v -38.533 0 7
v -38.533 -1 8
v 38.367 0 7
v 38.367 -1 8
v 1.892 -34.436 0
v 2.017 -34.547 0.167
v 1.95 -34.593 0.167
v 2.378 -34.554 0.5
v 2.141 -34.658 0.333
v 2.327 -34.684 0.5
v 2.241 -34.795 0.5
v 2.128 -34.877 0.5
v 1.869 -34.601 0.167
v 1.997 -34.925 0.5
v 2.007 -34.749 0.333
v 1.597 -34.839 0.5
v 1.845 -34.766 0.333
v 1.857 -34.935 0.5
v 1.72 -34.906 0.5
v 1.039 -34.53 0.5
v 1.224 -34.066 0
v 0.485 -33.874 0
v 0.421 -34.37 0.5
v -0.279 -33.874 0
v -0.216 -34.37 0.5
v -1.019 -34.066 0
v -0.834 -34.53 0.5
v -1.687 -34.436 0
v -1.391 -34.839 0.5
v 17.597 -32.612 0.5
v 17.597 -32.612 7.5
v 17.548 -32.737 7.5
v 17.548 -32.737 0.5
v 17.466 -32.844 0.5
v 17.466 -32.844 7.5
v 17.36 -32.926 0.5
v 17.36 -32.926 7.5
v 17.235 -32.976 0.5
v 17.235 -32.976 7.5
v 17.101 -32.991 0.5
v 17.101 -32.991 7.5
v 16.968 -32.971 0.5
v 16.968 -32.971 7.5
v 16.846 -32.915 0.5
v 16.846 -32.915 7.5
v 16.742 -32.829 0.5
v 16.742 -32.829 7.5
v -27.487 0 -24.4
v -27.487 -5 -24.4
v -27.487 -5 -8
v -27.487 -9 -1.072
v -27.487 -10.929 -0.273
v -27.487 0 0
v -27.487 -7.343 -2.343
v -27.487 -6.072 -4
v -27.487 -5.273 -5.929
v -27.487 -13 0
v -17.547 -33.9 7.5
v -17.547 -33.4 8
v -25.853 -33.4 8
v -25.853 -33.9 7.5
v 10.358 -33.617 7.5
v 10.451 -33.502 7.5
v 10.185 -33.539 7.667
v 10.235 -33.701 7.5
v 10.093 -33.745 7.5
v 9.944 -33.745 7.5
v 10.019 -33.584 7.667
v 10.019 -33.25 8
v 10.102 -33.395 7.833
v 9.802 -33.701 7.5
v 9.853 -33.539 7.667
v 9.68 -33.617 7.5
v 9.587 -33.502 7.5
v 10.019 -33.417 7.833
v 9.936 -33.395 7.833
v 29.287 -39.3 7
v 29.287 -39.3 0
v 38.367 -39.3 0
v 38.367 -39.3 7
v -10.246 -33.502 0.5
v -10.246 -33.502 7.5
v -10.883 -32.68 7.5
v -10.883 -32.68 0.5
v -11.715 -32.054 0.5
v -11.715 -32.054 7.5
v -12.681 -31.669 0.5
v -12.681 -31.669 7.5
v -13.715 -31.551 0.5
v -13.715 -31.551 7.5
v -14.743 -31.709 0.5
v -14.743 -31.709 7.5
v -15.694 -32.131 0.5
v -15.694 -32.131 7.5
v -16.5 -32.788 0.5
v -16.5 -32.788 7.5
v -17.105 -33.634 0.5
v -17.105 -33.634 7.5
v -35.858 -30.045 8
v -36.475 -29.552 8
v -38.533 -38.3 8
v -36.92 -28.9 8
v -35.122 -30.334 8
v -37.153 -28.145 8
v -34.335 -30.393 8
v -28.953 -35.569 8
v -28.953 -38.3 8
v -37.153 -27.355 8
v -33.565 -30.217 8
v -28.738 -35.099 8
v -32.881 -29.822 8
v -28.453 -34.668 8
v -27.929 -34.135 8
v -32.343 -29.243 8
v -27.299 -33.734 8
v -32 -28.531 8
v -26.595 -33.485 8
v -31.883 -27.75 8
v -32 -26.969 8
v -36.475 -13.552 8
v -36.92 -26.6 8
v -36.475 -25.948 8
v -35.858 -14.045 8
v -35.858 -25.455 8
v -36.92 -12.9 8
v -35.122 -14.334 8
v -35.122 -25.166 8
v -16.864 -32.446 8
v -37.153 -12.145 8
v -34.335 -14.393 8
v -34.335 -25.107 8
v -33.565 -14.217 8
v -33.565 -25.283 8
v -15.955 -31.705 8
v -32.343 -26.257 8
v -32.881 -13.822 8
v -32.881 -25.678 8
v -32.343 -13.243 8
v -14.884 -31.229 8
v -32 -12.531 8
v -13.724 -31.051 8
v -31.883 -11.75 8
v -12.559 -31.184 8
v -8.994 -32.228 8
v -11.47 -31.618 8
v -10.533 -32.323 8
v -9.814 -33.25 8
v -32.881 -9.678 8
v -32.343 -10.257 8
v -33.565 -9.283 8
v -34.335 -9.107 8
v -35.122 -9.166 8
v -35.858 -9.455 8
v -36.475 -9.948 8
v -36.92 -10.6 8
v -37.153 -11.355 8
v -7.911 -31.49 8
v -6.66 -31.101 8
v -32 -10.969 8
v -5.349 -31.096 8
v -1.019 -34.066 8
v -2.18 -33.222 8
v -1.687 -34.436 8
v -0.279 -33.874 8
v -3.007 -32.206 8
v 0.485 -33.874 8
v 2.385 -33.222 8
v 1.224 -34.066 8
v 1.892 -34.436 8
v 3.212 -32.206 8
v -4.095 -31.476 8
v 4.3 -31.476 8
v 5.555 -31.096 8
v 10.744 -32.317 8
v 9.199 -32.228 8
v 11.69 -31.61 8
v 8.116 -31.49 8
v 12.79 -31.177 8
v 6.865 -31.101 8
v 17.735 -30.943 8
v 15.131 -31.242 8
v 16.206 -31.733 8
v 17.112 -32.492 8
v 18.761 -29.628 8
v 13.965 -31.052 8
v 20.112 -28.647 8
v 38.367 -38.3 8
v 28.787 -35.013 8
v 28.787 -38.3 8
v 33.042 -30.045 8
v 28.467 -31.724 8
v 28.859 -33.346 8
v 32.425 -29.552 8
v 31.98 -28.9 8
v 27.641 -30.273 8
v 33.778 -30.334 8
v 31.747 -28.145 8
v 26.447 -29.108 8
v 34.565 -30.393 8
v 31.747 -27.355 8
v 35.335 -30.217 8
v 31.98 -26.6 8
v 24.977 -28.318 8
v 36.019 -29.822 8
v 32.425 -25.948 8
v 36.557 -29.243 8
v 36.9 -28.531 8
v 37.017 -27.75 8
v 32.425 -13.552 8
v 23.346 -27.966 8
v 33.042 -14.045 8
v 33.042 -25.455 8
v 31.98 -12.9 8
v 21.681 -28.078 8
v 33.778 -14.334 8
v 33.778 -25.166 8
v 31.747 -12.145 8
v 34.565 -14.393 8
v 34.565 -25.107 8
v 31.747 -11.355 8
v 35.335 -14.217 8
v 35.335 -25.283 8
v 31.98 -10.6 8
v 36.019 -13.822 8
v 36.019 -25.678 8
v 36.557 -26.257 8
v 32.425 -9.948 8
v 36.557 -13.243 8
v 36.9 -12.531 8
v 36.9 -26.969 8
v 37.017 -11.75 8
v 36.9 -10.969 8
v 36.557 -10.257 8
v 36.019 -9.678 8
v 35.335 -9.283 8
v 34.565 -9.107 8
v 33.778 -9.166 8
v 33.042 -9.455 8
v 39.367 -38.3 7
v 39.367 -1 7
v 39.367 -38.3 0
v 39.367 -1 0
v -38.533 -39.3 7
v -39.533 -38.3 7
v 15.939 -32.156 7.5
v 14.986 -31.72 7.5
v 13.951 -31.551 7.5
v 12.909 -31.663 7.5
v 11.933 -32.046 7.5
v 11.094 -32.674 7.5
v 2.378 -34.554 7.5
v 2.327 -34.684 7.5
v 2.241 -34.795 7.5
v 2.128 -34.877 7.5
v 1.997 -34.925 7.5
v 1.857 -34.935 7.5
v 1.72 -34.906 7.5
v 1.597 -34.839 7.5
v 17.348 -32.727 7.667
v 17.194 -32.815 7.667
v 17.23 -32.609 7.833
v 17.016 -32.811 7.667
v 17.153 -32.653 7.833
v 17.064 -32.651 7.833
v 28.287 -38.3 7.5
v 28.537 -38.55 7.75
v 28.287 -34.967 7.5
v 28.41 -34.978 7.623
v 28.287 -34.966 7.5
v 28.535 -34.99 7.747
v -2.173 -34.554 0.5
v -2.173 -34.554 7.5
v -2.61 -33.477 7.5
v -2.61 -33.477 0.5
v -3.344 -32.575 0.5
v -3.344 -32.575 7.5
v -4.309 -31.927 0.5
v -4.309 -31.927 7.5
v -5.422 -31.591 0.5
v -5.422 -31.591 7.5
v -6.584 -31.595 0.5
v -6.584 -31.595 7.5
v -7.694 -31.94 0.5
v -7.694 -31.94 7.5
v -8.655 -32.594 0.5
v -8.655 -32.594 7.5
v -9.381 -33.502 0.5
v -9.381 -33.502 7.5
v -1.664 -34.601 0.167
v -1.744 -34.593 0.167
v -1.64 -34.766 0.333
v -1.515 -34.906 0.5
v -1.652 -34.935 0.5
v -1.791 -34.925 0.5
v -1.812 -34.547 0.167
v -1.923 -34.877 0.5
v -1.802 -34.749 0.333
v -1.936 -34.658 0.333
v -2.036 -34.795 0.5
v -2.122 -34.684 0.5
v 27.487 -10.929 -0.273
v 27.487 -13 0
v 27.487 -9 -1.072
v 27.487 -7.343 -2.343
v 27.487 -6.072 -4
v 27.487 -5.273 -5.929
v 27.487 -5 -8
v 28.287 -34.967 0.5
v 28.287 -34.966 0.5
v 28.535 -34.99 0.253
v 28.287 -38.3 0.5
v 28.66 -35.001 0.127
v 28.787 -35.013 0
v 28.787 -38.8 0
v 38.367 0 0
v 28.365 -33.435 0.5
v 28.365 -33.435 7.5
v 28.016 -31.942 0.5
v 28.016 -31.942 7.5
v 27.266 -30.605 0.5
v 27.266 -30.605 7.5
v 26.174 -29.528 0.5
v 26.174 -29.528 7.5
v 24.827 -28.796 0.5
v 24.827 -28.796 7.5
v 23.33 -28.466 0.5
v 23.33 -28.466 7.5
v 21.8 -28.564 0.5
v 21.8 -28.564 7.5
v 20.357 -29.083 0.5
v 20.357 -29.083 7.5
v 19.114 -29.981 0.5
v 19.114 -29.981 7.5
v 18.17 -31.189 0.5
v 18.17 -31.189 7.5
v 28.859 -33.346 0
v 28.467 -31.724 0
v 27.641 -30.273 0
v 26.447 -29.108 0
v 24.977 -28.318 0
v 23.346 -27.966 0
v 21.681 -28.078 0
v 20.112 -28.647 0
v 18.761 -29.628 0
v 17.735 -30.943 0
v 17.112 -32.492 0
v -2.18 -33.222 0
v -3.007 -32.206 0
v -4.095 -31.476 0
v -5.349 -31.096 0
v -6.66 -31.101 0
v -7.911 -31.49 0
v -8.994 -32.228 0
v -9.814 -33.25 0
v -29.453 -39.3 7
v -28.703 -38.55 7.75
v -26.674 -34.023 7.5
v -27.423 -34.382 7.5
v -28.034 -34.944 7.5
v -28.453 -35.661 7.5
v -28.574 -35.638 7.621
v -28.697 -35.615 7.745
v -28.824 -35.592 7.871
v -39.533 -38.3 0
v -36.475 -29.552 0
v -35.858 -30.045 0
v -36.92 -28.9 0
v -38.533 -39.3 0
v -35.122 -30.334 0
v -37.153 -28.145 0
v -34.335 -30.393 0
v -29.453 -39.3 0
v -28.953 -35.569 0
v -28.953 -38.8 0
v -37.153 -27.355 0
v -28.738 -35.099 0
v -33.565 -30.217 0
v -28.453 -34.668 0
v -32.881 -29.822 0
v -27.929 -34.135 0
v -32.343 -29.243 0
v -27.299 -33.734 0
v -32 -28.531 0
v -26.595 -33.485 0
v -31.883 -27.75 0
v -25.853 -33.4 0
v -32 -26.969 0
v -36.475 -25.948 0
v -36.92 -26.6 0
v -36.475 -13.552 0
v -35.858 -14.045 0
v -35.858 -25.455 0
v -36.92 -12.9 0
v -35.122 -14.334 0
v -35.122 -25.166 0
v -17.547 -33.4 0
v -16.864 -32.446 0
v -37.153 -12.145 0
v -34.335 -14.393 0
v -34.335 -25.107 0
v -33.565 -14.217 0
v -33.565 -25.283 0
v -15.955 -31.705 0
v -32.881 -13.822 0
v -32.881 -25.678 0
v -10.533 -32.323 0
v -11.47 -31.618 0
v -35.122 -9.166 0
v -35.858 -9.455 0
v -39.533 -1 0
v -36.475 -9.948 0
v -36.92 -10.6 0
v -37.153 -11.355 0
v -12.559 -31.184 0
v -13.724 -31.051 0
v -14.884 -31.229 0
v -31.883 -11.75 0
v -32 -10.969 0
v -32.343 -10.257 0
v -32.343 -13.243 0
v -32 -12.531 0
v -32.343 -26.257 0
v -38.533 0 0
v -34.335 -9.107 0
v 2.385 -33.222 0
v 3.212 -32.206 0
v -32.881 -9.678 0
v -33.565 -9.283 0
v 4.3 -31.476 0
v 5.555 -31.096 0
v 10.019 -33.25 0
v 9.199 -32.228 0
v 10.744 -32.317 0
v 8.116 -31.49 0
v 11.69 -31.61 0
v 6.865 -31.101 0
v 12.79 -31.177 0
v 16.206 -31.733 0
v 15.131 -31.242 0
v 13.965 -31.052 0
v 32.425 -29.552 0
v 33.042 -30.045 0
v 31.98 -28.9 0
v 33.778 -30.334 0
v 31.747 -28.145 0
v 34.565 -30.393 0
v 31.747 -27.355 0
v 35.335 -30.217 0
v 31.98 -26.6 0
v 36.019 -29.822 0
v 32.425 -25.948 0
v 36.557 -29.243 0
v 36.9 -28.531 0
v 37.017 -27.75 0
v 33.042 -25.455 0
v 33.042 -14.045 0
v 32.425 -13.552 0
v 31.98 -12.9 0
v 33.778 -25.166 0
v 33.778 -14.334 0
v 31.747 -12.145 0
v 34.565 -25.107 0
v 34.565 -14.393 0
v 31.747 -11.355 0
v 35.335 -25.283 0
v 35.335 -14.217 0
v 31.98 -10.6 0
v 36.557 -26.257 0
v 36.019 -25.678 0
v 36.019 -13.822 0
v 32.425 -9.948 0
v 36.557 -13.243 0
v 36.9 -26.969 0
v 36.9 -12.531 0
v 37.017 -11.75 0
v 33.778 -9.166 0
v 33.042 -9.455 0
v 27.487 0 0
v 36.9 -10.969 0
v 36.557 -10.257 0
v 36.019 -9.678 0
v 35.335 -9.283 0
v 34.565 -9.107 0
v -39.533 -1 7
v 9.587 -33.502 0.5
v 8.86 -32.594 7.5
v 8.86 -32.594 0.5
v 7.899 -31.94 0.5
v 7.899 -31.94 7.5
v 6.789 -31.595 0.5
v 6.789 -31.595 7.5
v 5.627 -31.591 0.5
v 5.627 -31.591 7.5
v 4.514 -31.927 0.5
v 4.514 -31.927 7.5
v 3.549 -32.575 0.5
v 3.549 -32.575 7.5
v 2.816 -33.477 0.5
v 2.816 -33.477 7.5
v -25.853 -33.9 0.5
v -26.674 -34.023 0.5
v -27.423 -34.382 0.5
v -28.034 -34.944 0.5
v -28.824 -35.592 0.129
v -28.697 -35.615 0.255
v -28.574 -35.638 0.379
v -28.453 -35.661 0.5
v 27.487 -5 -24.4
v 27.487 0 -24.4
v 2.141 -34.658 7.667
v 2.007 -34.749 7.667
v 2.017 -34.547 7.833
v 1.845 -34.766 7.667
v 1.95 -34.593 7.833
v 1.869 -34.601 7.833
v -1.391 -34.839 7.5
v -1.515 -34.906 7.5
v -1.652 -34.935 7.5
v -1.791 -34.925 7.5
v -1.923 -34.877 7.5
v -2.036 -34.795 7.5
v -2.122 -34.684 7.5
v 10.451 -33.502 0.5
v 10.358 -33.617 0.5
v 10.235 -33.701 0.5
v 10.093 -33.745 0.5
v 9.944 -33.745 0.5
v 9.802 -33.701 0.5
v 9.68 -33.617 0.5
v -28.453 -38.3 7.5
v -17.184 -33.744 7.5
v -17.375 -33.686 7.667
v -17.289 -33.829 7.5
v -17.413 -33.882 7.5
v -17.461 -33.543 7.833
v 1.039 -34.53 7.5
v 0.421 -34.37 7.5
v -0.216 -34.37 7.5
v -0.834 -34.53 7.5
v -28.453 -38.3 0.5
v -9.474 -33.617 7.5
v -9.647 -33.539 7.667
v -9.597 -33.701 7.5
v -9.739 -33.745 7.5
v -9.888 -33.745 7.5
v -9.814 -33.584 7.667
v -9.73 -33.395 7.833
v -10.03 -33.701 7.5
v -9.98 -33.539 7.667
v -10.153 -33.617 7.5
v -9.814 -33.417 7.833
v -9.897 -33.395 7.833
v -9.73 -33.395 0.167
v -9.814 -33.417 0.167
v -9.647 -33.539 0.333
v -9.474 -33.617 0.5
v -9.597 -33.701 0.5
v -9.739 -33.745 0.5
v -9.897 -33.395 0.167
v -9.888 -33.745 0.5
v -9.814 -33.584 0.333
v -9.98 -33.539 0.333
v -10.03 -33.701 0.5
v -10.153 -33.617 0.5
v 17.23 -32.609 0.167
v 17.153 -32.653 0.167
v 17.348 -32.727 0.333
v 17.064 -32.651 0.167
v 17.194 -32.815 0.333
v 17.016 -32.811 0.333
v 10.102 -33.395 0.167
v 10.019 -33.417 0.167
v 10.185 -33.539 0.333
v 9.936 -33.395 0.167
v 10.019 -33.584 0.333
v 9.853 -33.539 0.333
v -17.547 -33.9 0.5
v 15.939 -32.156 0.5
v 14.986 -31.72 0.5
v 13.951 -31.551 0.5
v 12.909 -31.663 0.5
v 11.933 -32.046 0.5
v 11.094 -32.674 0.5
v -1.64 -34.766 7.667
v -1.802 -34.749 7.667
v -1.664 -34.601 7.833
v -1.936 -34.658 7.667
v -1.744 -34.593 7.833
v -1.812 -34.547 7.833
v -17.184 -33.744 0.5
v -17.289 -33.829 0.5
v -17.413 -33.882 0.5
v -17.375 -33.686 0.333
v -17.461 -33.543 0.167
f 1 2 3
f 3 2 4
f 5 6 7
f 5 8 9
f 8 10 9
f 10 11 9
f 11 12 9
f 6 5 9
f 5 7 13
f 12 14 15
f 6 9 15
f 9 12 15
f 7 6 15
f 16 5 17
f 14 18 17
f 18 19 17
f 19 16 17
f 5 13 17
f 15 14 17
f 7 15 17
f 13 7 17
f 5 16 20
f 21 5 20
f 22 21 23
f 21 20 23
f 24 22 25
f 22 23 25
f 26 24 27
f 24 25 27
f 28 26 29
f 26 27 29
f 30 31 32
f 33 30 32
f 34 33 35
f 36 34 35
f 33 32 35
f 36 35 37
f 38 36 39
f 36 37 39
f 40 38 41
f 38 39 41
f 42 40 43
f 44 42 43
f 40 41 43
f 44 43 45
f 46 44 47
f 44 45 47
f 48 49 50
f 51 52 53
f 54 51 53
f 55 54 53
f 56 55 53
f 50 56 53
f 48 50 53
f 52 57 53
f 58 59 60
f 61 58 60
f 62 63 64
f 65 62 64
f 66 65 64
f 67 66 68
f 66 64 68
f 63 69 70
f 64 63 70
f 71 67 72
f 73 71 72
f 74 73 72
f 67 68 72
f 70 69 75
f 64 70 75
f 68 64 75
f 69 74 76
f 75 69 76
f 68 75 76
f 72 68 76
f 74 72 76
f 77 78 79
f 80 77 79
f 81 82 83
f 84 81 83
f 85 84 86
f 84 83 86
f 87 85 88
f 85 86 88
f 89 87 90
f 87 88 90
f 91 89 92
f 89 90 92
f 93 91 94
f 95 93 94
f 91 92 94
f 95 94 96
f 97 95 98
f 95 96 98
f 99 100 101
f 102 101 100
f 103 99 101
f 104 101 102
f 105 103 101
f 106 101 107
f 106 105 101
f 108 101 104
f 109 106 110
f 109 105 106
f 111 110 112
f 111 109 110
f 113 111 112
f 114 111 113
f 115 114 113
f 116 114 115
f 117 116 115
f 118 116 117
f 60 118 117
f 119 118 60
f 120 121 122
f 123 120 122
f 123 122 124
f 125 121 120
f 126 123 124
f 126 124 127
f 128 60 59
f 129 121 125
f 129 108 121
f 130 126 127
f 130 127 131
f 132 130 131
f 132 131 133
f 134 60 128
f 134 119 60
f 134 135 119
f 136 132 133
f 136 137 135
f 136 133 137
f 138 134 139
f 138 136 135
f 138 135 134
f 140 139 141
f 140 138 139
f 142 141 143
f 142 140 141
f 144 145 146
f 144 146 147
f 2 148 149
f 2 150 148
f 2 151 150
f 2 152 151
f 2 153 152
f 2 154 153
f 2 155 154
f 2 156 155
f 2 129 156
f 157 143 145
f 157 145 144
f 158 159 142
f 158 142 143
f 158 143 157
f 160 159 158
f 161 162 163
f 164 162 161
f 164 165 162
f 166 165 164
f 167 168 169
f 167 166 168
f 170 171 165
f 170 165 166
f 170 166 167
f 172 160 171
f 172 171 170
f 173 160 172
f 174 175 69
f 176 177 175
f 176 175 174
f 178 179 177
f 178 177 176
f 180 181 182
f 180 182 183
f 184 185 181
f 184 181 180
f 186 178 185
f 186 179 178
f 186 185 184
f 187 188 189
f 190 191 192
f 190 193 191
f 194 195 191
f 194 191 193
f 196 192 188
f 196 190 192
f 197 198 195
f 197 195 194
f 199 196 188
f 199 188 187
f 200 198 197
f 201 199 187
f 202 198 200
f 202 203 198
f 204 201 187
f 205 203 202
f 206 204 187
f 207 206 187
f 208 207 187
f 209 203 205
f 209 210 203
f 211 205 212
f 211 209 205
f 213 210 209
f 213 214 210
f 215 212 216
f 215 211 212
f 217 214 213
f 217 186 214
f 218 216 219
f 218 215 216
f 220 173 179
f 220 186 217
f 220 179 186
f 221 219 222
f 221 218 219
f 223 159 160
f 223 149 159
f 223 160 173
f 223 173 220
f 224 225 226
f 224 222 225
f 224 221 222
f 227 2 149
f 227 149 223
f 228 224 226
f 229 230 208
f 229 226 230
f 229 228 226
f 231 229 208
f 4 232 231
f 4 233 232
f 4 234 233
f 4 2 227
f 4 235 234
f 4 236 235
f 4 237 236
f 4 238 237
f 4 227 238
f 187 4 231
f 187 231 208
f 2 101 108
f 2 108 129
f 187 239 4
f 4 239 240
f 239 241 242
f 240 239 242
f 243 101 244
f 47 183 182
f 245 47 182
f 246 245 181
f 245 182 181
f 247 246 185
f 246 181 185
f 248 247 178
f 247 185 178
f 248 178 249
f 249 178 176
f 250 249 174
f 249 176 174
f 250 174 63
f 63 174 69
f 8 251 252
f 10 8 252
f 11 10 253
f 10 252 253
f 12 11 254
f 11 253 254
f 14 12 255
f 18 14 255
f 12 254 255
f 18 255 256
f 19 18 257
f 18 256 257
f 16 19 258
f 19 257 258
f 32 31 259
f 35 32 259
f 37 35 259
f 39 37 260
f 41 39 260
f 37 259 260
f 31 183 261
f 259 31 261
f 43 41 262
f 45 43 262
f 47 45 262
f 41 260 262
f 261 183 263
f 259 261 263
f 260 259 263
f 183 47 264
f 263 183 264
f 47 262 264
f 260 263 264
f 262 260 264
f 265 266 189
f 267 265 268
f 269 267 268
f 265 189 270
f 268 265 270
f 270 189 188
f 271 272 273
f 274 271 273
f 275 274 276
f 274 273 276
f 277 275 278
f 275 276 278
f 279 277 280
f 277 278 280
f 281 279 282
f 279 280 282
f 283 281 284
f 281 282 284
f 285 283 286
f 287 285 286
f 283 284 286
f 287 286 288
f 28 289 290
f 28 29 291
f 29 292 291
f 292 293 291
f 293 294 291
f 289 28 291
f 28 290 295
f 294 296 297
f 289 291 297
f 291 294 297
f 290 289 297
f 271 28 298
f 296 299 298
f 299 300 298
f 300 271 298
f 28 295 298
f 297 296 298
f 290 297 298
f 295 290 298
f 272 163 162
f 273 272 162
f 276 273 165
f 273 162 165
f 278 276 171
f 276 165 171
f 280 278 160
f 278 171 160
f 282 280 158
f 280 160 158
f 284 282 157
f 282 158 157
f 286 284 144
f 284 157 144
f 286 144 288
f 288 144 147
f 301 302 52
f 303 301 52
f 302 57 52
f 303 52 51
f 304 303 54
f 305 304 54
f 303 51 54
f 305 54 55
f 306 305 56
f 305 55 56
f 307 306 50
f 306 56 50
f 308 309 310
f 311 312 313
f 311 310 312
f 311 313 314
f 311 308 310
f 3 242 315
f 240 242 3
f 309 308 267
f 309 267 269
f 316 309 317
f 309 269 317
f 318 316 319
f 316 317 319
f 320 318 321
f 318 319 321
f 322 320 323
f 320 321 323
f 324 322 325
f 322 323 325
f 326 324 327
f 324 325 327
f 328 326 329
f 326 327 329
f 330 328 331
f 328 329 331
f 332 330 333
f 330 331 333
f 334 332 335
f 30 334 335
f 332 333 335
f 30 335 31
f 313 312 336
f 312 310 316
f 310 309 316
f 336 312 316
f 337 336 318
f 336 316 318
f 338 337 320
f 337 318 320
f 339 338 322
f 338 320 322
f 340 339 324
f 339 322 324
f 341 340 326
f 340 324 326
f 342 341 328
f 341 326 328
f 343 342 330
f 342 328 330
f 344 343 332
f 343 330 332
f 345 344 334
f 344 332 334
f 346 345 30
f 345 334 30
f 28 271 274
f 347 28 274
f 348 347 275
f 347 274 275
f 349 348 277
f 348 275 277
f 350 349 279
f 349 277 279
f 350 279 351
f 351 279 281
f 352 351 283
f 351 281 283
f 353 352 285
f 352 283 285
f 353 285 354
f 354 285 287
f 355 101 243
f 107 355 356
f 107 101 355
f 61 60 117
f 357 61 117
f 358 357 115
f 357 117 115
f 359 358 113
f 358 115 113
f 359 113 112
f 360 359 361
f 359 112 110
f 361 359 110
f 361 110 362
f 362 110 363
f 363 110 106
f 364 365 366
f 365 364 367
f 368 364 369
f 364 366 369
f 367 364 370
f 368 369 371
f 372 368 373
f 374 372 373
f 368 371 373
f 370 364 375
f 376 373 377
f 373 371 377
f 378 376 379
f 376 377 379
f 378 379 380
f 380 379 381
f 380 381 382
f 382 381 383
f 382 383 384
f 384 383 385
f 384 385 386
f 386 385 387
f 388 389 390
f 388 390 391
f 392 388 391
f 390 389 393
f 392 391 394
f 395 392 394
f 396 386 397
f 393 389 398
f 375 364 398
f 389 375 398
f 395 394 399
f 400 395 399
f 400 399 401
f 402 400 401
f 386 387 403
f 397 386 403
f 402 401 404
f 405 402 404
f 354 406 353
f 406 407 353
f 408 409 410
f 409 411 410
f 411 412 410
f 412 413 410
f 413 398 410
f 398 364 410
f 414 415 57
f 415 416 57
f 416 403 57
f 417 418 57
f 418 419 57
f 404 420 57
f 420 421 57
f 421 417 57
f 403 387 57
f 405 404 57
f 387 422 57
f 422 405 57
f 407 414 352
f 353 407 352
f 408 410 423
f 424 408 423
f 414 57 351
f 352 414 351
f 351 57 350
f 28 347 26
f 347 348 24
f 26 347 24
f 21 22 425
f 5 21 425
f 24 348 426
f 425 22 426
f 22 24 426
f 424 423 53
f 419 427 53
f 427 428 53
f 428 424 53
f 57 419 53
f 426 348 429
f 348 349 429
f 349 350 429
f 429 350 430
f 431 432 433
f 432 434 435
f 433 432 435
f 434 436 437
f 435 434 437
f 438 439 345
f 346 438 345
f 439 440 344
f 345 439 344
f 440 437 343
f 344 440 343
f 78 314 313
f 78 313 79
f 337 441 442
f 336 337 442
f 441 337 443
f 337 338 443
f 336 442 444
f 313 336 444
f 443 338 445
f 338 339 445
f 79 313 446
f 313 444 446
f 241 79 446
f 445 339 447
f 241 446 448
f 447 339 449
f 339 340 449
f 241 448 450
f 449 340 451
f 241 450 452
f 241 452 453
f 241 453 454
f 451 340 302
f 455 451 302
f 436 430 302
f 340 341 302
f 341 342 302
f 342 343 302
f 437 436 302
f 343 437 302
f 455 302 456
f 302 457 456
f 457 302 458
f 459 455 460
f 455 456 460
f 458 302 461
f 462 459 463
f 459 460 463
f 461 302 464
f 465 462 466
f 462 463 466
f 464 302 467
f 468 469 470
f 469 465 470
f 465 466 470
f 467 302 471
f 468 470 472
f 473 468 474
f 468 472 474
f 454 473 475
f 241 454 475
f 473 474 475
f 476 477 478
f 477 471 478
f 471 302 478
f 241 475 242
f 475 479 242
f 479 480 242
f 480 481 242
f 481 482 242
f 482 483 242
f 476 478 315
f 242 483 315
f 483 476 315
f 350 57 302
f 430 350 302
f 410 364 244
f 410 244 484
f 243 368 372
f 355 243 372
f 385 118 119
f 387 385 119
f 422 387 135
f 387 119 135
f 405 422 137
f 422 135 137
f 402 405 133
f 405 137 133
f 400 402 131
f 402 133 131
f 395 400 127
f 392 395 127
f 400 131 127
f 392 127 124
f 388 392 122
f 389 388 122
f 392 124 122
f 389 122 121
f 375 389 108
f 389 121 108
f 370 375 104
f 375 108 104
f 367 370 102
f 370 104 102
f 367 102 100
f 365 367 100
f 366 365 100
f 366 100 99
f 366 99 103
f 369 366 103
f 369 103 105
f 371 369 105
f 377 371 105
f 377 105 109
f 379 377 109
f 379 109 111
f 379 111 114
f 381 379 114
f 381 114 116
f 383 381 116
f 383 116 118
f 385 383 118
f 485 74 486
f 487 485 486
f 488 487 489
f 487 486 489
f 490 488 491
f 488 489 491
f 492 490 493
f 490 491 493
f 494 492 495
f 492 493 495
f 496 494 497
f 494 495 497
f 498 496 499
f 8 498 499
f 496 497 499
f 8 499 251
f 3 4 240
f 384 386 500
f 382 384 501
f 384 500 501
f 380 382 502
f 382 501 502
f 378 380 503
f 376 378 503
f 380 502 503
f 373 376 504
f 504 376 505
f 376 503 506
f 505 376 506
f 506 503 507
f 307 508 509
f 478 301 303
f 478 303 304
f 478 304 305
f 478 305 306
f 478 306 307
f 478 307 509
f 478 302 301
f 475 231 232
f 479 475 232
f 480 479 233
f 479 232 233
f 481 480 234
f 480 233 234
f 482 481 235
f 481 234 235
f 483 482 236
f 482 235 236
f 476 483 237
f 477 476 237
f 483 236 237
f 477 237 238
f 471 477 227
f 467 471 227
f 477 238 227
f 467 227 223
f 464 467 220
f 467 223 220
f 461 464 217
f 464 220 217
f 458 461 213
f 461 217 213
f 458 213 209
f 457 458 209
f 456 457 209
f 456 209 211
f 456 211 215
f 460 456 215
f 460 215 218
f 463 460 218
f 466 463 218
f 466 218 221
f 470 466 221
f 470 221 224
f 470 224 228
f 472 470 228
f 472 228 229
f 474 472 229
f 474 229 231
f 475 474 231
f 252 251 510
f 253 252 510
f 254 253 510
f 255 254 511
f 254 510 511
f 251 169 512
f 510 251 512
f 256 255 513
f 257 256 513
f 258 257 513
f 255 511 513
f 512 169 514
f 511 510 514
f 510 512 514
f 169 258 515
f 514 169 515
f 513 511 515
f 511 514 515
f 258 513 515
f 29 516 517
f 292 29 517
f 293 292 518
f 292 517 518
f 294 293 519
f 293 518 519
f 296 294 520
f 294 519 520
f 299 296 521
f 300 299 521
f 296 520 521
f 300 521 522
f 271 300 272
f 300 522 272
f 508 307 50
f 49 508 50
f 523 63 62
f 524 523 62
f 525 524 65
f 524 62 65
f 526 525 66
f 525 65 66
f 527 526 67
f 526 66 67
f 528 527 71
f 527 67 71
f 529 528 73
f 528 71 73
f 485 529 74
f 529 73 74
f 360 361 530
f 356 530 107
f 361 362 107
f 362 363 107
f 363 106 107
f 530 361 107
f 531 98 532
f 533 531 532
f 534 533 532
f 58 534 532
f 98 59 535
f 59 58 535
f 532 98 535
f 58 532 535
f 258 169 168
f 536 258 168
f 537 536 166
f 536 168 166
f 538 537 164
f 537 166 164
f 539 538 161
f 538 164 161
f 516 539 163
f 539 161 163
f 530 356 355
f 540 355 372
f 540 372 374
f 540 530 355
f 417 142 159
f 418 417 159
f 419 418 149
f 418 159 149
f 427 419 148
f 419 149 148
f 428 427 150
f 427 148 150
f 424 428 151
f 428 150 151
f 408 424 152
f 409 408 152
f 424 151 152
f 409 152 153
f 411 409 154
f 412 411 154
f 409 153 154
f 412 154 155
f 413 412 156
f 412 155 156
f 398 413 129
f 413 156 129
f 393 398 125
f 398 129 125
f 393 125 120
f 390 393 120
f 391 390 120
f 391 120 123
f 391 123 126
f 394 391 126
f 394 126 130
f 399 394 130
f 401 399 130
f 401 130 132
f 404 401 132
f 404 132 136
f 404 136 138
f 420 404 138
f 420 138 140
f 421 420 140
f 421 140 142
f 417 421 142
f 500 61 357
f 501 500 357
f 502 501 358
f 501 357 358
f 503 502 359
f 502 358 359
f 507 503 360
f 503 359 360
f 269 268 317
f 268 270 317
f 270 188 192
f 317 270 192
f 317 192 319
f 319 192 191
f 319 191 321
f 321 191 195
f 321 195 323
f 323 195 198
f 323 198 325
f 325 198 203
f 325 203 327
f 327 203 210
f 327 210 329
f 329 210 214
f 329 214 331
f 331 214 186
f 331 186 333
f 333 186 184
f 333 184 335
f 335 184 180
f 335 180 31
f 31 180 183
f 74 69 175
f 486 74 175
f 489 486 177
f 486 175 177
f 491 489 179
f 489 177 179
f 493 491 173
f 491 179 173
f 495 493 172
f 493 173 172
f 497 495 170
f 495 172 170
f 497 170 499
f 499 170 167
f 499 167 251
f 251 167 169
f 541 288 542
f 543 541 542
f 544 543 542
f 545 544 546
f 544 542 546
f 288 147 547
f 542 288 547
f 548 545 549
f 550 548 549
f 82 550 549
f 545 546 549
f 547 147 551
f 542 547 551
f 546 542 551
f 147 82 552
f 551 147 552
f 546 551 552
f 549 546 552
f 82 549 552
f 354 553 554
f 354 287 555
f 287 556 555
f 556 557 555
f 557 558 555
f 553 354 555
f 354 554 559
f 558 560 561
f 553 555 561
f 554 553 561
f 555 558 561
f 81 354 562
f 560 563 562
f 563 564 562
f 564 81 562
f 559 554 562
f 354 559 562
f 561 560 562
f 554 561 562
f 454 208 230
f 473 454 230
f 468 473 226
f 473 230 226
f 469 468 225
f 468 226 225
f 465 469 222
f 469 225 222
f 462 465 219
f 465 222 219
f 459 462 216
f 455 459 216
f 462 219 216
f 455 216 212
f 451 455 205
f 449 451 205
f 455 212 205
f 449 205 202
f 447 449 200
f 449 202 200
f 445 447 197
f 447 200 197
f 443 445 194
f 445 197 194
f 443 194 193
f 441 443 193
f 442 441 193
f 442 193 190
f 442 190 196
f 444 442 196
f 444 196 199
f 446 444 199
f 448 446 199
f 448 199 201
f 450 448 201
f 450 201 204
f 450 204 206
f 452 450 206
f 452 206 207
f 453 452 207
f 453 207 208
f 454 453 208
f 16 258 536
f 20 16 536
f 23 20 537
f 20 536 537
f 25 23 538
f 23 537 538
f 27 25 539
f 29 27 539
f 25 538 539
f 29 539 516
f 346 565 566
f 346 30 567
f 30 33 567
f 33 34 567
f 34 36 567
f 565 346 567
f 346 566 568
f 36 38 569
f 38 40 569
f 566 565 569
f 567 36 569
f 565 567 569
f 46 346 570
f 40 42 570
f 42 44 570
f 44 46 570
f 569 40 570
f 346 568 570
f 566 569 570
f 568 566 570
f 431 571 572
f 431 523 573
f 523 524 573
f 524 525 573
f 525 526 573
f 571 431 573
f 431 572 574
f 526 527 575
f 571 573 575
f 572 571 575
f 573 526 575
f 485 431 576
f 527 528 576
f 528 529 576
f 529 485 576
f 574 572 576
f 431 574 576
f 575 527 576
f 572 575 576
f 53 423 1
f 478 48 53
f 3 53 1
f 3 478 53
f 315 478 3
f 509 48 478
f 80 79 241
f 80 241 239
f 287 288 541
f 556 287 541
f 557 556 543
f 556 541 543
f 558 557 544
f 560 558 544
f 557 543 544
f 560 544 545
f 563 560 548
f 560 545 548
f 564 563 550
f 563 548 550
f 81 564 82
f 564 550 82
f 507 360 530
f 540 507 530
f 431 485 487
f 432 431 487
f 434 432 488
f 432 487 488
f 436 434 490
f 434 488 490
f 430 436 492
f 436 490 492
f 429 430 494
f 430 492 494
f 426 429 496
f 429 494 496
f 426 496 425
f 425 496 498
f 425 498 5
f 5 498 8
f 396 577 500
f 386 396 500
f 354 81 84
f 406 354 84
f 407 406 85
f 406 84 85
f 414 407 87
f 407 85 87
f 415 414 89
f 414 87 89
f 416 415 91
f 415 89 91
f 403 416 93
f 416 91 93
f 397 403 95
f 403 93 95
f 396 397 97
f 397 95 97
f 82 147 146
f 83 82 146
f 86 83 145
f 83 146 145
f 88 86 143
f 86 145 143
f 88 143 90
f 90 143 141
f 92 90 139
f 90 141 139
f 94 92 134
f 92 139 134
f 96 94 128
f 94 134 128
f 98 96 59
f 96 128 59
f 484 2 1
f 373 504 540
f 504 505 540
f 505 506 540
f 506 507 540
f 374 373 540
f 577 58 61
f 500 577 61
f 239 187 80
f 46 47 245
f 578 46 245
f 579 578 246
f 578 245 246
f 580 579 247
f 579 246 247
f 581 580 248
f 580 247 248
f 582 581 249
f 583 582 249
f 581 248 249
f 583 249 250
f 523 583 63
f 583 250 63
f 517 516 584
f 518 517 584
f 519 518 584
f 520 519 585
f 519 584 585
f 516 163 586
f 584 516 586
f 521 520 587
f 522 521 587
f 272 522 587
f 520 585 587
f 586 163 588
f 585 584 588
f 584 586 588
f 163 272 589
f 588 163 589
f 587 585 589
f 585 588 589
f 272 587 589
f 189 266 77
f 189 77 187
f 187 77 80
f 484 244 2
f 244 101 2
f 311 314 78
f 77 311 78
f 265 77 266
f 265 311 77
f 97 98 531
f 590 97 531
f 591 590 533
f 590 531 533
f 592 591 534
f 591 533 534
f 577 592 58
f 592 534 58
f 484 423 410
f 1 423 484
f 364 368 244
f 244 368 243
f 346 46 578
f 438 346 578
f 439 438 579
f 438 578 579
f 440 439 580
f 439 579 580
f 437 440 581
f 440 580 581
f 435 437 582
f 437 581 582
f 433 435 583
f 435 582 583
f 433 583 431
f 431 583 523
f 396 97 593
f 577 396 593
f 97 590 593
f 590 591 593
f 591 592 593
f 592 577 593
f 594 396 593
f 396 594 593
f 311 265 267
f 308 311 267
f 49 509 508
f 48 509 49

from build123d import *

# Parameters (mm, degrees)
SKETCH4_W           = 78.9
SKETCH4_H           = 39.3
BOSS_EXTRUDE2_DEPTH = 8
CUT_EXTRUDE2_REACH  = 58.315
CUT_EXTRUDE3_REACH  = 58.315
SKETCH7_R           = 2.65
CHAMFER3_SIZE       = 1
CHAMFER4_SIZE       = 0.5
SKETCH8_W           = 54.974490404
SKETCH8_H           = 5
BOSS_EXTRUDE3_DEPTH = 24.4
FILLET1_R           = 8


with BuildPart() as part:
    # Sketch4 → Boss-Extrude2 (new body)
    with BuildSketch(Plane.XY):
        with Locations((-0.082754798, -19.65)):
            Rectangle(SKETCH4_W, SKETCH4_H)
    extrude(amount=BOSS_EXTRUDE2_DEPTH)

    # Sketch6 → Cut-Extrude2 (cut, up to next)
    with BuildSketch(Plane.XY.offset(8), mode=Mode.PRIVATE) as cut_extrude2_sk1:
        with BuildLine():
            Line((28.287245202, -39.5), (28.287245202, -34.966633333))
            ThreePointArc((28.287245202, -34.966633333), (24.090185885, -28.57821772), (17.597136747, -32.611513376))
            ThreePointArc((17.597136747, -32.611513376), (17.234869858, -32.976161871), (16.742475109, -32.828672095))
            ThreePointArc((16.742475109, -32.828672095), (13.426365224, -31.57225608), (10.450959192, -33.501537013))
            ThreePointArc((10.450959192, -33.501537013), (10.018755802, -33.750140454), (9.586552412, -33.501537013))
            ThreePointArc((9.586552412, -33.501537013), (5.626846324, -31.591156717), (2.378419018, -34.553680172))
            ThreePointArc((2.378419018, -34.553680172), (2.064006845, -34.905939189), (1.596551631, -34.839403086))
            ThreePointArc((1.596551631, -34.839403086), (0.102573651, -34.35), (-1.39140433, -34.839403086))
            ThreePointArc((-1.39140433, -34.839403086), (-1.858859544, -34.905939189), (-2.173271717, -34.553680172))
            ThreePointArc((-2.173271717, -34.553680172), (-5.421699023, -31.591156717), (-9.381405111, -33.501537013))
            ThreePointArc((-9.381405111, -33.501537013), (-9.813608501, -33.750140454), (-10.245811891, -33.501537013))
            ThreePointArc((-10.245811891, -33.501537013), (-13.71465449, -31.550736756), (-17.105314368, -33.634463277))
            ThreePointArc((-17.105314368, -33.634463277), (-17.289281672, -33.828504165), (-17.54693295, -33.9))
            Line((-17.54693295, -33.9), (-25.852754798, -33.9))
            ThreePointArc((-25.852754798, -33.9), (-27.422811269, -34.381612052), (-28.452754798, -35.660769515))
            Line((-28.452754798, -35.660769515), (-28.452754798, -39.5))
            Line((-28.452754798, -39.5), (28.287245202, -39.5))
        make_face()
    cut_extrude2_tool1 = extrude(cut_extrude2_sk1.sketch, amount=-CUT_EXTRUDE2_REACH, mode=Mode.PRIVATE) & part.part
    add(cut_extrude2_tool1.solids().sort_by_distance((2.671043, -35.689379, 8))[0], mode=Mode.SUBTRACT)

    # Sketch7 → Cut-Extrude3 (cut, up to next)
    with BuildSketch(Plane.XY.offset(8), mode=Mode.PRIVATE) as cut_extrude3_sk1:
        with Locations((-34.532754798, -11.75)):
            Circle(SKETCH7_R)
    cut_extrude3_tool1 = extrude(cut_extrude3_sk1.sketch, amount=-CUT_EXTRUDE3_REACH, mode=Mode.PRIVATE) & part.part
    # Sketch7 → Cut-Extrude3 (cut, up to next)
    with BuildSketch(Plane.XY.offset(8), mode=Mode.PRIVATE) as cut_extrude3_sk2:
        with Locations((-34.532754798, -27.75)):
            Circle(SKETCH7_R)
    cut_extrude3_tool2 = extrude(cut_extrude3_sk2.sketch, amount=-CUT_EXTRUDE3_REACH, mode=Mode.PRIVATE) & part.part
    # Sketch7 → Cut-Extrude3 (cut, up to next)
    with BuildSketch(Plane.XY.offset(8), mode=Mode.PRIVATE) as cut_extrude3_sk3:
        with Locations((34.367245202, -11.75)):
            Circle(SKETCH7_R)
    cut_extrude3_tool3 = extrude(cut_extrude3_sk3.sketch, amount=-CUT_EXTRUDE3_REACH, mode=Mode.PRIVATE) & part.part
    # Sketch7 → Cut-Extrude3 (cut, up to next)
    with BuildSketch(Plane.XY.offset(8), mode=Mode.PRIVATE) as cut_extrude3_sk4:
        with Locations((34.367245202, -27.75)):
            Circle(SKETCH7_R)
    cut_extrude3_tool4 = extrude(cut_extrude3_sk4.sketch, amount=-CUT_EXTRUDE3_REACH, mode=Mode.PRIVATE) & part.part
    add(cut_extrude3_tool1.solids().sort_by_distance((-34.532755, -11.75, 8))[0], mode=Mode.SUBTRACT)
    add(cut_extrude3_tool2.solids().sort_by_distance((-34.532755, -27.75, 8))[0], mode=Mode.SUBTRACT)
    add(cut_extrude3_tool3.solids().sort_by_distance((34.367245, -11.75, 8))[0], mode=Mode.SUBTRACT)
    add(cut_extrude3_tool4.solids().sort_by_distance((34.367245, -27.75, 8))[0], mode=Mode.SUBTRACT)

    # Chamfer3
    chamfer3_edges = [part.edges().sort_by_distance(p)[0] for p in [
        (-0.082754798, 0, 8),
        (-39.532754798, -19.65, 8),
        (33.827245202, -39.3, 8),
        (-28.452754798, -39.3, 4),
        (28.287245202, -39.3, 4),
        (-33.992754798, -39.3, 8),
        (39.367245202, -19.65, 8),
        (-39.532754798, -39.3, 4),
        (-39.532754798, 0, 4),
        (39.367245202, 0, 4),
        (39.367245202, -39.3, 4),
    ]]
    chamfer(chamfer3_edges, length=CHAMFER3_SIZE)

    # Chamfer4
    chamfer4_edges = [part.edges().sort_by_distance(p)[0] for p in [
        (-27.422811269, -34.381612052, 0),
        (-21.699843874, -33.9, 0),
        (-17.289281672, -33.828504165, 0),
        (-13.71465449, -31.550736756, 0),
        (-9.813608501, -33.750140454, 0),
        (-5.421699023, -31.591156717, 0),
        (-1.858859544, -34.905939189, 0),
        (0.102573651, -34.35, 0),
        (2.064006845, -34.905939189, 0),
        (24.090185885, -28.57821772, 0),
        (5.626846324, -31.591156717, 0),
        (17.234869858, -32.976161871, 0),
        (10.018755802, -33.750140454, 0),
        (13.426365224, -31.57225608, 0),
    ]]
    chamfer(chamfer4_edges, length=CHAMFER4_SIZE - 0.0001)  # a hair under: the kernel refuses the full size
    chamfer4_2_edges = [part.edges().sort_by_distance(p)[0] for p in [
        (28.287245202, -37.41718435, 0),
    ]]
    chamfer(chamfer4_2_edges, length=CHAMFER4_SIZE)
    chamfer4_3_edges = [part.edges().sort_by_distance(p)[0] for p in [
        (-27.422811269, -34.381612052, 8),
        (-21.699843874, -33.9, 8),
        (-17.289281672, -33.828504165, 8),
        (-13.71465449, -31.550736756, 8),
        (-9.813608501, -33.750140454, 8),
        (-5.421699023, -31.591156717, 8),
        (-1.858859544, -34.905939189, 8),
        (0.102573651, -34.35, 8),
        (2.064006845, -34.905939189, 8),
        (24.090185885, -28.57821772, 8),
        (5.626846324, -31.591156717, 8),
        (17.234869858, -32.976161871, 8),
        (10.018755802, -33.750140454, 8),
        (13.426365224, -31.57225608, 8),
    ]]
    chamfer(chamfer4_3_edges, length=CHAMFER4_SIZE - 0.0001)  # a hair under: the kernel refuses the full size
    chamfer4_4_edges = [part.edges().sort_by_distance(p)[0] for p in [
        (28.287245202, -37.41718435, 8),
    ]]
    chamfer(chamfer4_4_edges, length=CHAMFER4_SIZE)
    chamfer4_5_edges = [part.edges().sort_by_distance(p)[0] for p in [
        (-28.452754798, -36.980384758, 0),
    ]]
    chamfer(chamfer4_5_edges, length=CHAMFER4_SIZE - 0.0001)  # a hair under: the kernel refuses the full size
    chamfer4_6_edges = [part.edges().sort_by_distance(p)[0] for p in [
        (-28.452754798, -36.980384758, 8),
    ]]
    chamfer(chamfer4_6_edges, length=CHAMFER4_SIZE - 0.0001)  # a hair under: the kernel refuses the full size

    # Sketch8 → Boss-Extrude3 (add)
    with BuildSketch(Plane(origin=(0, 0, 0), x_dir=(-1, 0, 0), z_dir=(0, 0, -1))):
        with Locations((0, -2.5)):
            Rectangle(SKETCH8_W, SKETCH8_H)
    extrude(amount=BOSS_EXTRUDE3_DEPTH)

    # Fillet1
    fillet1_edges = [part.edges().sort_by_distance(p)[0] for p in [
        (0, -5, 0),
    ]]
    fillet(fillet1_edges, radius=FILLET1_R)


solid = part.part
